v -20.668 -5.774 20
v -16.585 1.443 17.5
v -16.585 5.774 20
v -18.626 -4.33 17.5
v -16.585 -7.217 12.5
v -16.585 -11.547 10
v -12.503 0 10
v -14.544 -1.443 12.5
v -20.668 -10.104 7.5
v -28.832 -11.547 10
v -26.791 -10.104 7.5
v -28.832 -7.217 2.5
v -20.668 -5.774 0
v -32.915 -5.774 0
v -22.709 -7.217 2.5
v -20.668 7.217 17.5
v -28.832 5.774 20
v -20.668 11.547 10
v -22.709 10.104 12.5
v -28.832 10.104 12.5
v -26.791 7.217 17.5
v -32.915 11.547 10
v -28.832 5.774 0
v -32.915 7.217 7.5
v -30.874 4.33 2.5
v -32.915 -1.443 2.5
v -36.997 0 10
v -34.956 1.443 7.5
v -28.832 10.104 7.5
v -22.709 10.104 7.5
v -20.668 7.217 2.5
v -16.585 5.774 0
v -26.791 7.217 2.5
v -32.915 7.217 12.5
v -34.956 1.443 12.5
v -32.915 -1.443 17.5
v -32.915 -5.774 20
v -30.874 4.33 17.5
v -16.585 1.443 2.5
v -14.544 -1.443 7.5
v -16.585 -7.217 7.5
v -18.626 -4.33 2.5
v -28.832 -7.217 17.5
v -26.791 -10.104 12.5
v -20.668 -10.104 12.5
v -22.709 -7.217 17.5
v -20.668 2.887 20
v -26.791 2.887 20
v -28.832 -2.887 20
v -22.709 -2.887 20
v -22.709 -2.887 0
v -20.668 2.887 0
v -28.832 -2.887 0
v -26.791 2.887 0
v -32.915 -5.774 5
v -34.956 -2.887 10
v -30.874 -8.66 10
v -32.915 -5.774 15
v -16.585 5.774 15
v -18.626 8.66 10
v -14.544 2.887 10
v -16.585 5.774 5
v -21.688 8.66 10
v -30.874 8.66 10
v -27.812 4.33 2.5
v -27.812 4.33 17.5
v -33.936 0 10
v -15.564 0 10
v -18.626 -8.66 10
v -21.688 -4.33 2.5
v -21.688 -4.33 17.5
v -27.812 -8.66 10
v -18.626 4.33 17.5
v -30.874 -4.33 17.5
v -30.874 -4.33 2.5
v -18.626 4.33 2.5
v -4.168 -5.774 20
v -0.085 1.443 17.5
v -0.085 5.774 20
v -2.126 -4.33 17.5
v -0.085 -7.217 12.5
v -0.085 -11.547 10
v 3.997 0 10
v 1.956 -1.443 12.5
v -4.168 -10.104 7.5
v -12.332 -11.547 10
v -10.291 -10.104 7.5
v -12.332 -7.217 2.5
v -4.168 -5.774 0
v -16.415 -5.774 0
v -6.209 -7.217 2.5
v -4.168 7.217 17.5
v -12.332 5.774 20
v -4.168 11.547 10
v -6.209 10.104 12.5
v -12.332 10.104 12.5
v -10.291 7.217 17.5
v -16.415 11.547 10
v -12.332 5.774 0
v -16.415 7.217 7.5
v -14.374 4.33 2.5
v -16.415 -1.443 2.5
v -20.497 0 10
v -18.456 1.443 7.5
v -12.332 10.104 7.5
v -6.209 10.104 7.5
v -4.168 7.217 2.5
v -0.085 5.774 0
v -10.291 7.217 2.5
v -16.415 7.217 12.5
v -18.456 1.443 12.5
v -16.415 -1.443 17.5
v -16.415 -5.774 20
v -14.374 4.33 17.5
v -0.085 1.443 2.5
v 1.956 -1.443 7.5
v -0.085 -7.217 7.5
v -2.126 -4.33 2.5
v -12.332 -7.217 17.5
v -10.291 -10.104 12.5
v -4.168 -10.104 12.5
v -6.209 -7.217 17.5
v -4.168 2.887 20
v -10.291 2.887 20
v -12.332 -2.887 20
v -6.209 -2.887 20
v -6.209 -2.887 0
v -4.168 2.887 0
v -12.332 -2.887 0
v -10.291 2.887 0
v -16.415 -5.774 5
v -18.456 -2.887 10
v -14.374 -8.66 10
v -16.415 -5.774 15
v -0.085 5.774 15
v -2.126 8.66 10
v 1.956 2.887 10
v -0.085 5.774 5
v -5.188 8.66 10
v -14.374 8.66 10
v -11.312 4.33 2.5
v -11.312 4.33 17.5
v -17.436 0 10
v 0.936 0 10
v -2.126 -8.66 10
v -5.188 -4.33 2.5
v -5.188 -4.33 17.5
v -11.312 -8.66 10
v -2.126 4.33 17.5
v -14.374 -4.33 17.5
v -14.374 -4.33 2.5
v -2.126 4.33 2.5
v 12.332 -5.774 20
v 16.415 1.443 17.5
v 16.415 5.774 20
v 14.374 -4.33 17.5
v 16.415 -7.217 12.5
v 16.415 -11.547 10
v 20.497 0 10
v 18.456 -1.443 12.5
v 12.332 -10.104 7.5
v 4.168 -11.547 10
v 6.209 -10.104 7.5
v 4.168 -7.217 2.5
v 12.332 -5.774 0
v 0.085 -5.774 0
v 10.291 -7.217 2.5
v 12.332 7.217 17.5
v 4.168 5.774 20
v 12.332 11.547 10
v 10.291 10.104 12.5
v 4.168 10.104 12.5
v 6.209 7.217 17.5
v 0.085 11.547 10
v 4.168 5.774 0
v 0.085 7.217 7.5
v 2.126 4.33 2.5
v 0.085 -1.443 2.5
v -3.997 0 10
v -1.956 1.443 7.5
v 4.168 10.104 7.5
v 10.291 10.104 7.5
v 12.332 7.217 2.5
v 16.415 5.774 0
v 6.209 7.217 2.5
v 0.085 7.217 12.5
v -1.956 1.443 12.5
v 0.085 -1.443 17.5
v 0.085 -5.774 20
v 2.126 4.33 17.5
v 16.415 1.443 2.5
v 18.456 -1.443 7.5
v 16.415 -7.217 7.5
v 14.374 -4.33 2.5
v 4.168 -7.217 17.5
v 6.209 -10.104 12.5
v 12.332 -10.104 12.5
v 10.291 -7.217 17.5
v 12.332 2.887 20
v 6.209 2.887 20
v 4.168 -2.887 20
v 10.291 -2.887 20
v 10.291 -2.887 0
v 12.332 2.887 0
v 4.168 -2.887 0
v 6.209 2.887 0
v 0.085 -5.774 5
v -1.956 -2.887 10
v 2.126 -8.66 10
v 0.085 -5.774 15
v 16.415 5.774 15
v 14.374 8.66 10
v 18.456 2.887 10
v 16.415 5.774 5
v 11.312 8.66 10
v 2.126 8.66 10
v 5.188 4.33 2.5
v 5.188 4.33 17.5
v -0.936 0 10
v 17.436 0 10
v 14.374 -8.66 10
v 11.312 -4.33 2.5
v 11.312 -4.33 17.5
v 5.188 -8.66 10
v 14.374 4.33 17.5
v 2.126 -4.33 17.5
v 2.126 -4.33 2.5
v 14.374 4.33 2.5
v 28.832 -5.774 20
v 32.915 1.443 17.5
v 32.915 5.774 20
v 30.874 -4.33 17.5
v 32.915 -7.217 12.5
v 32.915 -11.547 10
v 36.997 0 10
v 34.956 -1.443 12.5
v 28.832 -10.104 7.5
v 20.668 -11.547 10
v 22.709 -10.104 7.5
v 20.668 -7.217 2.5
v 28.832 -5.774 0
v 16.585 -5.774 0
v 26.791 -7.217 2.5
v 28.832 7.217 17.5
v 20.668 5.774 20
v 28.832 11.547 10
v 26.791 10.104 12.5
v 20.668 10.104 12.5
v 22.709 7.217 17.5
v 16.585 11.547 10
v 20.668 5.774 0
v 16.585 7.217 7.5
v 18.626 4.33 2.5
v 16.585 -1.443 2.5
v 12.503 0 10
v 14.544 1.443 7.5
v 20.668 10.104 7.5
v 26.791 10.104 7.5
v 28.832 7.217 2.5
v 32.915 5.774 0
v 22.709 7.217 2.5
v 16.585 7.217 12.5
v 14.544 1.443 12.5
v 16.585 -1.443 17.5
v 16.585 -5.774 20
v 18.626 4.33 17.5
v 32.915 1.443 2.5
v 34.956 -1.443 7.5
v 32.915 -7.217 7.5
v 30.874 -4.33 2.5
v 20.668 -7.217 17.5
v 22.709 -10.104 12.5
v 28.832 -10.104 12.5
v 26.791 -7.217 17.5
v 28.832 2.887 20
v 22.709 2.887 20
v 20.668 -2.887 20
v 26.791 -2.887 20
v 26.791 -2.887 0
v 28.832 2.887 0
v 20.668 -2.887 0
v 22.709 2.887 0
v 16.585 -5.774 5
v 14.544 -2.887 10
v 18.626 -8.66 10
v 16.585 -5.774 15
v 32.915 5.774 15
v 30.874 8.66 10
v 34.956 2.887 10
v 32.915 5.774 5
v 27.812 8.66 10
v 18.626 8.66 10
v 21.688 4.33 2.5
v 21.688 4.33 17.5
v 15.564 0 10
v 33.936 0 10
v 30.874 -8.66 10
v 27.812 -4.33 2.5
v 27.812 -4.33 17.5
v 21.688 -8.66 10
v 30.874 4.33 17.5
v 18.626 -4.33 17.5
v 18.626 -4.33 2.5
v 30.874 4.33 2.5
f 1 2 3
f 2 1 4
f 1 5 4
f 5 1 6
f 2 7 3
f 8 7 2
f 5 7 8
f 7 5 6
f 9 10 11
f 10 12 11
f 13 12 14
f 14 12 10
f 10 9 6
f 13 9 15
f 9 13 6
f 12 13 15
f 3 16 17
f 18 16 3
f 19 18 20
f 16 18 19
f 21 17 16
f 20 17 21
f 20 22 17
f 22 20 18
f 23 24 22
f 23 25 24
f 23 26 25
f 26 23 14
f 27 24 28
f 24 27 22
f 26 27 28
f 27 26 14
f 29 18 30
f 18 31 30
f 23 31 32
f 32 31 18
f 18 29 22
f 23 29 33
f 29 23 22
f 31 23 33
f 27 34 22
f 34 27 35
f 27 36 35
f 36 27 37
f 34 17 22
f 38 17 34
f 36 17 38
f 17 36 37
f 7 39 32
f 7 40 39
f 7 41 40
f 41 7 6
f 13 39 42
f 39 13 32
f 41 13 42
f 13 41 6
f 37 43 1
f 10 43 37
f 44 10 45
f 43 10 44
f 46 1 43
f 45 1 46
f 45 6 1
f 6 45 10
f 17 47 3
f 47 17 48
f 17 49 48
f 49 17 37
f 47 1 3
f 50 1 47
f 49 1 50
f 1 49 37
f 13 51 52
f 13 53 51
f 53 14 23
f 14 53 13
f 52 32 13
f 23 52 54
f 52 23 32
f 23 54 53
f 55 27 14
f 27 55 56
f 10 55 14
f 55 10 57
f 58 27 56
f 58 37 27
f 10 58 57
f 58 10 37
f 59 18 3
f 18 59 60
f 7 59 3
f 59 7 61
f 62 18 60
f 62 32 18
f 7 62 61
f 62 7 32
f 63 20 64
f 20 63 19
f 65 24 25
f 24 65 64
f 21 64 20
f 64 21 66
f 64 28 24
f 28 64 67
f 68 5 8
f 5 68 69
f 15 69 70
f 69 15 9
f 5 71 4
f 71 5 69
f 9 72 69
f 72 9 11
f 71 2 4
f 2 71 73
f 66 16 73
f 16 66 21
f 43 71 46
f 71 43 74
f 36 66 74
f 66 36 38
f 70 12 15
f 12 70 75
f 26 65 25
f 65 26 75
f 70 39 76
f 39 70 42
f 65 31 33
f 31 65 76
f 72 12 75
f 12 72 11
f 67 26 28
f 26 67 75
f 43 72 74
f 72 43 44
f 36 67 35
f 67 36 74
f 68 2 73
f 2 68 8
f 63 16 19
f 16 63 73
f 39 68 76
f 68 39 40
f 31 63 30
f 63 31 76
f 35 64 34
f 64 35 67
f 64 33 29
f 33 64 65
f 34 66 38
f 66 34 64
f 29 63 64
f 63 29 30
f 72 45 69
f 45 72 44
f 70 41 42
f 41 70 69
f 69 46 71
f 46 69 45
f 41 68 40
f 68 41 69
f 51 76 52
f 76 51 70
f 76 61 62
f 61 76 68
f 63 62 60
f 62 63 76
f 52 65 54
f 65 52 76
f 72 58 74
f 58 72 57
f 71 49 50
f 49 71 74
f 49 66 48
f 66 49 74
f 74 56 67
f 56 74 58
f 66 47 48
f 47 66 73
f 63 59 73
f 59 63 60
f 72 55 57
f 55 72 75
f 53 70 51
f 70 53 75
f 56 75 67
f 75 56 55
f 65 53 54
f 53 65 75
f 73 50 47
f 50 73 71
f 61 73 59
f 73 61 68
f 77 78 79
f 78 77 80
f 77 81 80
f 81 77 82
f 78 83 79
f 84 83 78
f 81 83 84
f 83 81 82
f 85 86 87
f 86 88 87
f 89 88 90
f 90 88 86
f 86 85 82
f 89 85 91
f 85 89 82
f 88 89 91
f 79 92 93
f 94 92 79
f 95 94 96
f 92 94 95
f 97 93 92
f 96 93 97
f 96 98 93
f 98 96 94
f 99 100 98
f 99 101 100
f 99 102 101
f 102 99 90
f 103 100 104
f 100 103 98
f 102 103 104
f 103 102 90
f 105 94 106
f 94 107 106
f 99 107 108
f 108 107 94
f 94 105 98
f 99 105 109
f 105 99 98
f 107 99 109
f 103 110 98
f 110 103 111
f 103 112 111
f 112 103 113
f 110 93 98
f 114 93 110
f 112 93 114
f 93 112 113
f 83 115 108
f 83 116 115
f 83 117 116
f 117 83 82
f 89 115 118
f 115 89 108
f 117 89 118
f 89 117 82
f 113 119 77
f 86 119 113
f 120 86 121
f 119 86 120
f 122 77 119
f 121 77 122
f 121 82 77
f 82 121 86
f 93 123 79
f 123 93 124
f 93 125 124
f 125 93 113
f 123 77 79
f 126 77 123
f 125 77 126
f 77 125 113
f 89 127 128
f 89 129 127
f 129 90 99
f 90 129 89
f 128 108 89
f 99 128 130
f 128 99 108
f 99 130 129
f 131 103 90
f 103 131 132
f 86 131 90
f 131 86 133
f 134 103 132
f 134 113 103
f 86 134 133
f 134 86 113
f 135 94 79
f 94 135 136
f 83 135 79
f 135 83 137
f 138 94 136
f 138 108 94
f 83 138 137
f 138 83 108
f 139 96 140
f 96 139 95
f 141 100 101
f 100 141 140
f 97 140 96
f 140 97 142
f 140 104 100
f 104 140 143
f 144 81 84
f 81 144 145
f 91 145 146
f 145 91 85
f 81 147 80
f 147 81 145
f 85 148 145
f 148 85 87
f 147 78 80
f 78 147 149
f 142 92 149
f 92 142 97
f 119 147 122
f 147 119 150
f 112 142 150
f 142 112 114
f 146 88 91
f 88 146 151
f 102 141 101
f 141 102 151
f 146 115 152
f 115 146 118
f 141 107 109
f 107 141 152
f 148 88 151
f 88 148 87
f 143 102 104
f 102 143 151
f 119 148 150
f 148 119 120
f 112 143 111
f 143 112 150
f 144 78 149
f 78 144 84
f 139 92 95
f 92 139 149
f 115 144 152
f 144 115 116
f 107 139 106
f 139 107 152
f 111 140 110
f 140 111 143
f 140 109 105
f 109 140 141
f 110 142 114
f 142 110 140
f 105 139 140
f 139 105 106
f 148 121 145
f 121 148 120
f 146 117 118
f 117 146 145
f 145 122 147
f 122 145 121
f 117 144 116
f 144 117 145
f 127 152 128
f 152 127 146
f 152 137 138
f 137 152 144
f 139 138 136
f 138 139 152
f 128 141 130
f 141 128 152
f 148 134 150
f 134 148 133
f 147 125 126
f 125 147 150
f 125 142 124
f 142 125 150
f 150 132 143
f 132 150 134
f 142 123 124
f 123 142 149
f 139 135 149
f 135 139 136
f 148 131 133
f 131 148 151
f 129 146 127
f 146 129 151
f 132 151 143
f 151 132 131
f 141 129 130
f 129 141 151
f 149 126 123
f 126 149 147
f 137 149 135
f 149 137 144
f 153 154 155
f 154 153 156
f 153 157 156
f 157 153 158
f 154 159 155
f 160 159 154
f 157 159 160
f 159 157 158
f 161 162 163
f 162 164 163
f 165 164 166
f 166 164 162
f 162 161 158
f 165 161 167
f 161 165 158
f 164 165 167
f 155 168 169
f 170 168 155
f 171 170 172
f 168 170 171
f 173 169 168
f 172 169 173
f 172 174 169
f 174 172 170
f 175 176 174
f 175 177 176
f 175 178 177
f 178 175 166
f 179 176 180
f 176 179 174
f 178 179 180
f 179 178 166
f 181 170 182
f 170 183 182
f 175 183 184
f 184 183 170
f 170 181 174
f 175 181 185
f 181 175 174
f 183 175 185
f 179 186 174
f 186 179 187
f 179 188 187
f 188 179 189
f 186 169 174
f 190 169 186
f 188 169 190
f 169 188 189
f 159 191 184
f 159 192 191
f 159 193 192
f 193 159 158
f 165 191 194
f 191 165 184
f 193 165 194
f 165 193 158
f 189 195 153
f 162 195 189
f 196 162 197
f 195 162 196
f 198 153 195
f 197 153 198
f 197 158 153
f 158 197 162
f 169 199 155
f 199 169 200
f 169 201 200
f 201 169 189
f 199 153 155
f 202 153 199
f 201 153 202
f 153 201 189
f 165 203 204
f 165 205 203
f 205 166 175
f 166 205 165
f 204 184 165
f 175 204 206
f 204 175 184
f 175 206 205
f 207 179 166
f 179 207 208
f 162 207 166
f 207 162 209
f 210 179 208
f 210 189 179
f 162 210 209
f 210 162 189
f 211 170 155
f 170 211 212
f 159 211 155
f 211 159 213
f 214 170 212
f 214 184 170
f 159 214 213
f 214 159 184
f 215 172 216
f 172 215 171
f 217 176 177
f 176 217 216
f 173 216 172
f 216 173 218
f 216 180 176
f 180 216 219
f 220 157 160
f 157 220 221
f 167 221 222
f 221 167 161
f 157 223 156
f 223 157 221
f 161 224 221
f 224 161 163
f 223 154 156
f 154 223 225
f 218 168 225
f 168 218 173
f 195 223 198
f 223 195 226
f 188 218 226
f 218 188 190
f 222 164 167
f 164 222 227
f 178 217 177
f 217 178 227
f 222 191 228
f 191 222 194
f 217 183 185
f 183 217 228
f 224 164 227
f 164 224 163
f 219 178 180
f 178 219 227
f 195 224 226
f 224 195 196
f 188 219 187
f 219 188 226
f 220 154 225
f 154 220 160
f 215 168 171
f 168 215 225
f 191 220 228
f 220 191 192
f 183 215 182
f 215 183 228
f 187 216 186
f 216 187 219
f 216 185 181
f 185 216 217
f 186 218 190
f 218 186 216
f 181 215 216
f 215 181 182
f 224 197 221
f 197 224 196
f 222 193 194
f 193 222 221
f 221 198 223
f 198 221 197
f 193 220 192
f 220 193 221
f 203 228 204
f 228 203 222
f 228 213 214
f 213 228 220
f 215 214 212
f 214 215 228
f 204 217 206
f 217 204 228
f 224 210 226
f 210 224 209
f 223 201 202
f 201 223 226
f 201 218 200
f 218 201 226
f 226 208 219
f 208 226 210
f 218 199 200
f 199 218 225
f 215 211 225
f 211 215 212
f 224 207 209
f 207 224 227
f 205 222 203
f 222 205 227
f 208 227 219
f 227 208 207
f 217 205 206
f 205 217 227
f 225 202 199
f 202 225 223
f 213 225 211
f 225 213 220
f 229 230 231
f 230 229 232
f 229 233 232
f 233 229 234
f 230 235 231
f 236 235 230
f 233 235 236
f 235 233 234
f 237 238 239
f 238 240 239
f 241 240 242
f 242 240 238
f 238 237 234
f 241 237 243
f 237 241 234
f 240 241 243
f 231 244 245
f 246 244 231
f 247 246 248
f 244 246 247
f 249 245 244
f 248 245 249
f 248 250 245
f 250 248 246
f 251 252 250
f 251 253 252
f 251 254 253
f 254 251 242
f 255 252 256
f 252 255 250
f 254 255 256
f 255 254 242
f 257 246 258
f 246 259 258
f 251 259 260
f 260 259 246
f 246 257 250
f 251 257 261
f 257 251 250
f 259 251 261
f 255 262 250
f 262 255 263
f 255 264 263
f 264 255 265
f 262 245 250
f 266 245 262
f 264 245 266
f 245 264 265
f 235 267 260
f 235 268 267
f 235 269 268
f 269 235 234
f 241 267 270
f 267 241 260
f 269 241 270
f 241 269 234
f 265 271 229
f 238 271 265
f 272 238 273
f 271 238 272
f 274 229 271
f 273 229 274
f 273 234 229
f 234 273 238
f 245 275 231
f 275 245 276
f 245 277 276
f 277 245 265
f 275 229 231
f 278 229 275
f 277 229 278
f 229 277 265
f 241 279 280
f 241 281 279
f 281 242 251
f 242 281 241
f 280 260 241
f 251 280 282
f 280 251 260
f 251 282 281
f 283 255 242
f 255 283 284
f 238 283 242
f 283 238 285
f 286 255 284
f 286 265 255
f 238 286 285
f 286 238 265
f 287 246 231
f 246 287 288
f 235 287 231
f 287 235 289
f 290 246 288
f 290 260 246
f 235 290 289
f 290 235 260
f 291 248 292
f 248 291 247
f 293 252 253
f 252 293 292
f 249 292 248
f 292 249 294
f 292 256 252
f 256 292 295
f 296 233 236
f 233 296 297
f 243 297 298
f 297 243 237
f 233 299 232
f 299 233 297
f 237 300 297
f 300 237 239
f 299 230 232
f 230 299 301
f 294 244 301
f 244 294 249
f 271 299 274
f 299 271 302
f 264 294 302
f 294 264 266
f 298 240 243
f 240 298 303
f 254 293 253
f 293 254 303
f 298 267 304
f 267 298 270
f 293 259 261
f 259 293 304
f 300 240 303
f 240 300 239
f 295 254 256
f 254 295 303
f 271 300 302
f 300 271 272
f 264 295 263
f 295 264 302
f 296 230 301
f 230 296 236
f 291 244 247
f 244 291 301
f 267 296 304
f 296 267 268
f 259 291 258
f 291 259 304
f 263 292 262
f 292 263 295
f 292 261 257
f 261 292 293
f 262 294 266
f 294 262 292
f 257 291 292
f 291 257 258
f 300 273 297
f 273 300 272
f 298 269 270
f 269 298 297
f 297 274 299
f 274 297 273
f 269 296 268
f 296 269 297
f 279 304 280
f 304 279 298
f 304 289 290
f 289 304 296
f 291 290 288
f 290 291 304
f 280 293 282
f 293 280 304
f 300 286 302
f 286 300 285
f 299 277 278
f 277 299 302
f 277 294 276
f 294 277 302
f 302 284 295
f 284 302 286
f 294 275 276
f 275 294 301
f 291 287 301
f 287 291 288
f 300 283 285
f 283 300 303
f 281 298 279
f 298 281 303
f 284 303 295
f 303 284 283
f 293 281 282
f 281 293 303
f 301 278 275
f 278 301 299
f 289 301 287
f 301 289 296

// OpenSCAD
// rhombic dodecahedra chain

L=40;// height of module
w=0.5;// fraction of face to hollow
d=16.5;// extruder offset
f=1.03;// fudge fit
n=28;// number in circle (minimum with w=0.5)

s=w/2+0.5;

//rotate([0,0,90]) scale(0.4)loop(6); // this is the default
//scale(0.4)ring(n);
///halfchain(3);
//scale(0.4) translate([-d,0,0])chain(6);
scale(0.5) translate([-d,0,0]) chain(4);
//color([0,1,0])translate([-2*d,0,0.1])halfchain(3);
%cube([206,260,1],center=true);

module loop(p){
translate([-p*d,0,0])ring(n/2);
translate([0,2*d*f/sin(360/n),0])chain(p);
rotate([0,0,180]){translate([-p*d,0,0])ring(n/2);
	translate([0,2*d*f/sin(360/n),0])chain(p);}
}

module ring(m){
for(i=[0:(m-1)]){
	rotate([0,0,i*360/n])translate([0,2*d*f/sin(360/n),0])openRhomb();
}}

module chain(n){
translate([-(n-1)*1*d+d,0,0])for(i=[1:n]){
	translate([(i-1)*2*d,0,0])openRhomb();
}}

module halfchain(n){
translate([-(n-1)*2*d+d,0,0])for(i=[1:n]){
	translate([(i-1)*4*d,0,0])openRhomb();
}}

module openRhomb(){
render()
rotate([0,0,acos(1/3)/2])translate([0,0,L/2])rotate([-45,0,90])
difference(){
	rhombDodeca(1);
	rhombDodeca(s);
	rotate([90,0,0])rhombDodeca(s);
	rotate([0,90,0])rhombDodeca(s);
}}

module rhombDodeca(s){
intersection(){
	rotate([0,0,45])cube(L*[1/s,1/s,2],center=true);
	rotate([0,45,0])cube(L*[s,2,s],center=true);
	rotate([45,0,0])cube(L*[2,s,s],center=true);
}}
